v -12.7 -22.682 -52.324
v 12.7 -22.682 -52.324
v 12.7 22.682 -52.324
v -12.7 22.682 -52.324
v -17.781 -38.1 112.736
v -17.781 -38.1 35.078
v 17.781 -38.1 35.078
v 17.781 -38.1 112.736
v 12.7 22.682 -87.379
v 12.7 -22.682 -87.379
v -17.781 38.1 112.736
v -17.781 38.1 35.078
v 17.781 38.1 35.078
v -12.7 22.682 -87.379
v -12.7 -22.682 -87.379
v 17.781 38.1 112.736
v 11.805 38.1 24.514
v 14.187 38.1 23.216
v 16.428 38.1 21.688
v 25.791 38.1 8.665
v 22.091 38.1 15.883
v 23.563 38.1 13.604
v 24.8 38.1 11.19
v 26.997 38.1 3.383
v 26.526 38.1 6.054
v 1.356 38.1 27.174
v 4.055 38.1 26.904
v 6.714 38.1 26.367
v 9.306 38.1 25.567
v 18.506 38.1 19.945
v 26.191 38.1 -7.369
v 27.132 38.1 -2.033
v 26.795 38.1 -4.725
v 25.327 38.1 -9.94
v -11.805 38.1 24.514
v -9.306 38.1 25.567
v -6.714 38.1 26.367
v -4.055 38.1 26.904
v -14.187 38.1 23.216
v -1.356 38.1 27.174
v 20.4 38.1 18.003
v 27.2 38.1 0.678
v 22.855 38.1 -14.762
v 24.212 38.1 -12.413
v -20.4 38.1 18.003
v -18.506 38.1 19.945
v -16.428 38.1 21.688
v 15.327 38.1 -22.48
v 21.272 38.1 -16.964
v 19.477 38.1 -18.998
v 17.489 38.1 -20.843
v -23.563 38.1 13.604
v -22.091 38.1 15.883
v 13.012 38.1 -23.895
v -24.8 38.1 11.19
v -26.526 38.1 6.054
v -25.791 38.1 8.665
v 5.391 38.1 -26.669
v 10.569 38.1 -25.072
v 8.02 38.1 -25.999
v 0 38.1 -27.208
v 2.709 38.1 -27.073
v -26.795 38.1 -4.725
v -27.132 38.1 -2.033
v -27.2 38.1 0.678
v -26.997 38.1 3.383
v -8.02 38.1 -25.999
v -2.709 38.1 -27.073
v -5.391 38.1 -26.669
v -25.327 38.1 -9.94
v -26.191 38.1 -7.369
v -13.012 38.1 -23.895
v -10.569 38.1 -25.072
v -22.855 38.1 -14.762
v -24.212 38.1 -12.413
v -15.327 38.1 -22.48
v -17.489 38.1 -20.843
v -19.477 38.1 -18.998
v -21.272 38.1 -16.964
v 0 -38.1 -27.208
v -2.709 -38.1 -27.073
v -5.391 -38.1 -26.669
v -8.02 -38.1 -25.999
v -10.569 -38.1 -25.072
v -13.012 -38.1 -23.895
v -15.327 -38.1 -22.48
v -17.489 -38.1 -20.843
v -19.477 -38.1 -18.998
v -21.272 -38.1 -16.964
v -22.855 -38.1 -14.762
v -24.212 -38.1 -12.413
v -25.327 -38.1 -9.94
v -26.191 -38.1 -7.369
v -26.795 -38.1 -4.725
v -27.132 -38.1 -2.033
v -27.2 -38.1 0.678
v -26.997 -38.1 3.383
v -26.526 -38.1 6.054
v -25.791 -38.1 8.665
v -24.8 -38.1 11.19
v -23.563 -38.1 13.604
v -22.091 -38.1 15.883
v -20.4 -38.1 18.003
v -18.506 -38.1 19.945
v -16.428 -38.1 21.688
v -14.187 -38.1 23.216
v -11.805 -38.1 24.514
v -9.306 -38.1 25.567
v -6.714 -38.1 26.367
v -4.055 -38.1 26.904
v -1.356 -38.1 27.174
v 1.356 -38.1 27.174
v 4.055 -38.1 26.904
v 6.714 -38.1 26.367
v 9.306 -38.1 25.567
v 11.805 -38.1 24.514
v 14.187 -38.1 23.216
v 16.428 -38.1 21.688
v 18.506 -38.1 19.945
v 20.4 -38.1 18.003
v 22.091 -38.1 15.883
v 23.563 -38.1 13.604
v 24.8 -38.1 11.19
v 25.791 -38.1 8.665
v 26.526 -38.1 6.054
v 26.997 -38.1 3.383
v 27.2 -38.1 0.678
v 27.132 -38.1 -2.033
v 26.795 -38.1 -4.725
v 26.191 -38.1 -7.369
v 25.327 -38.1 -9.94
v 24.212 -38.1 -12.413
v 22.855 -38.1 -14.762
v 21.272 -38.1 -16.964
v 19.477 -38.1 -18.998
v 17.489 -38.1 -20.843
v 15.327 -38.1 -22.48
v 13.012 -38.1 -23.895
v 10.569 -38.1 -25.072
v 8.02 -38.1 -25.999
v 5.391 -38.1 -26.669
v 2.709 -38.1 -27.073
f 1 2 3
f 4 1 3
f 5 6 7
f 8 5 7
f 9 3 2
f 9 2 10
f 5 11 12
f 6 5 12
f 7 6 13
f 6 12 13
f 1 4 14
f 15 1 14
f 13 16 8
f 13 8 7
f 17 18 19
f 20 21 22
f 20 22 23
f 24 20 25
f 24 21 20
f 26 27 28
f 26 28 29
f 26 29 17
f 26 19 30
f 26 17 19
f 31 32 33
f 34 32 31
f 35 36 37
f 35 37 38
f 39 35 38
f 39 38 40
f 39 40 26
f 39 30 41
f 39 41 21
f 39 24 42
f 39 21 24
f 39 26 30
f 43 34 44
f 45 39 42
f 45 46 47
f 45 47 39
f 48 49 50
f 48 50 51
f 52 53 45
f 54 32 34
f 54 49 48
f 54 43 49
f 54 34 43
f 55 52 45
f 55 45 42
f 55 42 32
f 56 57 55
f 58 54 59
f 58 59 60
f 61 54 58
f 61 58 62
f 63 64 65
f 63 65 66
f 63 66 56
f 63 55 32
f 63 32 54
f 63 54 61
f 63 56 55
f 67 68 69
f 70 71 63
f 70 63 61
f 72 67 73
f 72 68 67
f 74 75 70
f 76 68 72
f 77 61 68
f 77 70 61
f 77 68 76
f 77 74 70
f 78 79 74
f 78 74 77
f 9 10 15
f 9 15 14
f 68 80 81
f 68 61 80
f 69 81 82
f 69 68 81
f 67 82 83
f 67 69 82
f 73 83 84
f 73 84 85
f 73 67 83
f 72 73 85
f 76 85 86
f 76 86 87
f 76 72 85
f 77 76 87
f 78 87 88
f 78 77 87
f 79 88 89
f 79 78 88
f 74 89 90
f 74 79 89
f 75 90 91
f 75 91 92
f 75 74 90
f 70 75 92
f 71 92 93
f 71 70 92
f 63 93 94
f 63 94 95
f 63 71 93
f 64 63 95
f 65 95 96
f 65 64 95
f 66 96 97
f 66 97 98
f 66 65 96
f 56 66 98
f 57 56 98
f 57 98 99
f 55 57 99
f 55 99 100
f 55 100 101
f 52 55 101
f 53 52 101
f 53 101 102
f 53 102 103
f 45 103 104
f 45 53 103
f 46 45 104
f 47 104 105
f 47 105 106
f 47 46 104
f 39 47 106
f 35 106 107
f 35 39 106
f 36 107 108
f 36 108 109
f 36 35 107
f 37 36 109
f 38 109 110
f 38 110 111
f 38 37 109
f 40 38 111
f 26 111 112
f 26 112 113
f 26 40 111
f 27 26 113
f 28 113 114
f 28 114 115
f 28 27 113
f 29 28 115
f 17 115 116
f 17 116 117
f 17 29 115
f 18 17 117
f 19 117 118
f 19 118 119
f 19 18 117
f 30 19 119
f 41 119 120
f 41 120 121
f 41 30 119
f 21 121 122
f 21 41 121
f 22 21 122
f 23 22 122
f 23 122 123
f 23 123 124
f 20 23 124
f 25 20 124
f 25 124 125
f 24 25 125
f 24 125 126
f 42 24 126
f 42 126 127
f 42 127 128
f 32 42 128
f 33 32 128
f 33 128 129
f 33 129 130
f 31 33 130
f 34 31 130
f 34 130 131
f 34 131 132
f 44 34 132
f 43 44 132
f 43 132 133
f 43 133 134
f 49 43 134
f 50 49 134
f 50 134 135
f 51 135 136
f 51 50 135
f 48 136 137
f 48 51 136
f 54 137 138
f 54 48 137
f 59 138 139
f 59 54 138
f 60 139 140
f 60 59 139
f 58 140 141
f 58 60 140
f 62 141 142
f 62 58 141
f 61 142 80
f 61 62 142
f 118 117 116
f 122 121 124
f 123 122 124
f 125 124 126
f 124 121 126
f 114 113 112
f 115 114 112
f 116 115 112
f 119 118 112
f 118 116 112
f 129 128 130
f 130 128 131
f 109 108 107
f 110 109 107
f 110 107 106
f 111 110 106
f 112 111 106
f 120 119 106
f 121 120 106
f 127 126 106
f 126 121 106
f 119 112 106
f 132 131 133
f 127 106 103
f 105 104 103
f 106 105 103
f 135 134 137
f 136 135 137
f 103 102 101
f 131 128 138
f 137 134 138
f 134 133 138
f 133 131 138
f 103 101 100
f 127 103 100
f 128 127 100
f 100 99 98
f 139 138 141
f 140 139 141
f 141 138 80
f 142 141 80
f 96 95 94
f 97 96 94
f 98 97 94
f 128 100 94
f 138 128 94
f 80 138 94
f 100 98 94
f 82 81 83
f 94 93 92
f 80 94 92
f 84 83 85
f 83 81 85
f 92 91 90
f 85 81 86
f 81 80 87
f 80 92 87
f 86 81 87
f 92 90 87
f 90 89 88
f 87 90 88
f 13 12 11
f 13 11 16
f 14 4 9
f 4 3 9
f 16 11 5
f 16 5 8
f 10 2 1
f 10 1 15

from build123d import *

# Parameters (mm, degrees)
SKETCH1_W             = 35.054568066
SKETCH1_H             = 45.364735144
BOSS_EXTRUDE1_DEPTH   = 12.7
SKETCH2_R             = 27.208020157
BOSS_EXTRUDE2_DEPTH   = 38.1
SKETCH2_W             = 35.562487798
SKETCH2_H             = 77.657804896
BOSS_EXTRUDE2_2_DEPTH = 38.1


with BuildPart() as part:
    # Sketch1 → Boss-Extrude1 (new, symmetric)
    with BuildSketch(Plane(origin=(0, 0, 0), x_dir=(0, 0, -1), z_dir=(1, 0, 0))):
        with Locations((69.851381954, 0)):
            Rectangle(SKETCH1_W, SKETCH1_H)
    extrude(amount=BOSS_EXTRUDE1_DEPTH, both=True)


with BuildPart() as body_2:
    # Sketch2 → Boss-Extrude2 (new, symmetric)
    with BuildSketch(Plane(origin=(0, 0, 0), x_dir=(1, 0, 0), z_dir=(0, 1, 0))):
        Circle(SKETCH2_R)
    extrude(amount=BOSS_EXTRUDE2_DEPTH, both=True)


with BuildPart() as body_3:
    # Sketch2 → Boss-Extrude2 2 (new, symmetric)
    with BuildSketch(Plane(origin=(0, 0, 0), x_dir=(1, 0, 0), z_dir=(0, 1, 0))):
        with Locations((0, -73.906657099)):
            Rectangle(SKETCH2_W, SKETCH2_H)
    extrude(amount=BOSS_EXTRUDE2_2_DEPTH, both=True)


solid = Compound([part.part, body_2.part, body_3.part])
